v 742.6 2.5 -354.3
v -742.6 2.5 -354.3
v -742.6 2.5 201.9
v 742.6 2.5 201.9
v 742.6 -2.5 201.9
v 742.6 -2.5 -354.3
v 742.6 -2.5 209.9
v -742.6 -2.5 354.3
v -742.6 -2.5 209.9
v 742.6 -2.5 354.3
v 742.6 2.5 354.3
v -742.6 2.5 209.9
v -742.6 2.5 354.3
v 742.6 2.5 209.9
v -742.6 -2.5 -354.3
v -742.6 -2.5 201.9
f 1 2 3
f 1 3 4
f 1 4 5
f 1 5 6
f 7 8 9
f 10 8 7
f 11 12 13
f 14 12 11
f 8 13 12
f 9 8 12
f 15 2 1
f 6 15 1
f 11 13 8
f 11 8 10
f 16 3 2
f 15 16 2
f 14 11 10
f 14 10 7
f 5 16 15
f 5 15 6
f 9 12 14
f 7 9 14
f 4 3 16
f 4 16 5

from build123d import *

# Parameters (mm, degrees)
BOSS_EXTRUDE1_DEPTH             = 2.5
BOSS_EXTRUDE1_DEPTH_BACK        = 2.5
SKETCH1_W                       = 1473.2
SKETCH1_H                       = 544.2
BOSS_EXTRUDE1_2_DEPTH           = 2.5
BOSS_EXTRUDE1_2_DEPTH_BACK      = 2.5
SKETCH1_H_2                     = 132.4
BOSS_EXTRUDE2_REACH             = 816.8
SKETCH2_W                       = 1485.2
SKETCH2_H                       = 556.2
SKETCH2_W_2                     = 1473.2
SKETCH2_H_2                     = 544.2
SKETCH2_H_3                     = 144.4
SKETCH2_H_4                     = 132.4
BOSS_EXTRUDE2_DIRECTION_2_REACH = 816.8


with BuildPart() as part:
    # Sketch1 → Boss-Extrude1 (new, two sides: drawn at the far end of the back side and taken through both)
    with BuildSketch(Plane(origin=(0, 0, 0), x_dir=(1, 0, 0), z_dir=(0, 1, 0)).offset(-BOSS_EXTRUDE1_DEPTH_BACK)):
        with Locations((0, 76.2)):
            Rectangle(SKETCH1_W, SKETCH1_H)
    extrude(amount=BOSS_EXTRUDE1_DEPTH + BOSS_EXTRUDE1_DEPTH_BACK)

    # Boss-Extrude2: up to this face of the body (flat: up to its plane)
    boss_extrude2_end = Plane(part.part.faces().sort_by_distance((0, 2.5, -76.2))[0])
    # Sketch2 → Boss-Extrude2 (add, up to the picked face)
    with BuildSketch(Plane(origin=(0, 0, 0), x_dir=(1, 0, 0), z_dir=(0, 1, 0)), mode=Mode.PRIVATE) as boss_extrude2_sk1:
        with Locations((0, 76.2)):
            Rectangle(SKETCH2_W, SKETCH2_H)
        with Locations((0, 76.2)):
            Rectangle(SKETCH2_W_2, SKETCH2_H_2, mode=Mode.SUBTRACT)
    boss_extrude2_tool1 = split(extrude(boss_extrude2_sk1.sketch, amount=BOSS_EXTRUDE2_REACH, mode=Mode.PRIVATE), bisect_by=boss_extrude2_end, keep=Keep.BOTH, mode=Mode.PRIVATE)
    # Sketch2 → Boss-Extrude2 (add, up to the picked face)
    with BuildSketch(Plane(origin=(0, 0, 0), x_dir=(1, 0, 0), z_dir=(0, 1, 0)), mode=Mode.PRIVATE) as boss_extrude2_sk2:
        with Locations((0, -282.1)):
            Rectangle(SKETCH2_W, SKETCH2_H_3)
        with Locations((0, -282.1)):
            Rectangle(SKETCH2_W_2, SKETCH2_H_4, mode=Mode.SUBTRACT)
    boss_extrude2_tool2 = split(extrude(boss_extrude2_sk2.sketch, amount=BOSS_EXTRUDE2_REACH, mode=Mode.PRIVATE), bisect_by=boss_extrude2_end, keep=Keep.BOTH, mode=Mode.PRIVATE)


with BuildPart() as body_2:
    # Sketch1 → Boss-Extrude1 2 (new, two sides: drawn at the far end of the back side and taken through both)
    with BuildSketch(Plane(origin=(0, 0, 0), x_dir=(1, 0, 0), z_dir=(0, 1, 0)).offset(-BOSS_EXTRUDE1_2_DEPTH_BACK)):
        with Locations((0, -282.1)):
            Rectangle(SKETCH1_W, SKETCH1_H_2)
    extrude(amount=BOSS_EXTRUDE1_2_DEPTH + BOSS_EXTRUDE1_2_DEPTH_BACK)


with BuildPart() as part_1:
    add(part.part)

    add(body_2.part)  # Boss-Extrude2 merges body 2
    add(boss_extrude2_tool1.solids().sort_by(Axis((0, 0, -352.714069), (0, 1, 0)))[0])
    add(boss_extrude2_tool2.solids().sort_by(Axis((0, 0, 352.807797), (0, 1, 0)))[0])

    # Boss-Extrude2 direction 2: up to this face of the body (flat: up to its plane)
    boss_extrude2_direction_2_end = Plane(part_1.part.faces().sort_by_distance((0, -2.5, -76.2))[0])
    # Sketch2 → Boss-Extrude2 direction 2 (add, up to the picked face)
    with BuildSketch(Plane(origin=(0, 0, 0), x_dir=(1, 0, 0), z_dir=(0, 1, 0)), mode=Mode.PRIVATE) as boss_extrude2_direction_2_sk1:
        with Locations((0, 76.2)):
            Rectangle(SKETCH2_W, SKETCH2_H)
        with Locations((0, 76.2)):
            Rectangle(SKETCH2_W_2, SKETCH2_H_2, mode=Mode.SUBTRACT)
    boss_extrude2_direction_2_tool1 = split(extrude(boss_extrude2_direction_2_sk1.sketch, amount=-BOSS_EXTRUDE2_DIRECTION_2_REACH, mode=Mode.PRIVATE), bisect_by=boss_extrude2_direction_2_end, keep=Keep.BOTH, mode=Mode.PRIVATE)
    # Sketch2 → Boss-Extrude2 direction 2 (add, up to the picked face)
    with BuildSketch(Plane(origin=(0, 0, 0), x_dir=(1, 0, 0), z_dir=(0, 1, 0)), mode=Mode.PRIVATE) as boss_extrude2_direction_2_sk2:
        with Locations((0, -282.1)):
            Rectangle(SKETCH2_W, SKETCH2_H_3)
        with Locations((0, -282.1)):
            Rectangle(SKETCH2_W_2, SKETCH2_H_4, mode=Mode.SUBTRACT)
    boss_extrude2_direction_2_tool2 = split(extrude(boss_extrude2_direction_2_sk2.sketch, amount=-BOSS_EXTRUDE2_DIRECTION_2_REACH, mode=Mode.PRIVATE), bisect_by=boss_extrude2_direction_2_end, keep=Keep.BOTH, mode=Mode.PRIVATE)
    add(boss_extrude2_direction_2_tool1.solids().sort_by(Axis((0, 0, -352.714069), (0, -1, 0)))[0])
    add(boss_extrude2_direction_2_tool2.solids().sort_by(Axis((0, 0, 352.807797), (0, -1, 0)))[0])


solid = part_1.part
